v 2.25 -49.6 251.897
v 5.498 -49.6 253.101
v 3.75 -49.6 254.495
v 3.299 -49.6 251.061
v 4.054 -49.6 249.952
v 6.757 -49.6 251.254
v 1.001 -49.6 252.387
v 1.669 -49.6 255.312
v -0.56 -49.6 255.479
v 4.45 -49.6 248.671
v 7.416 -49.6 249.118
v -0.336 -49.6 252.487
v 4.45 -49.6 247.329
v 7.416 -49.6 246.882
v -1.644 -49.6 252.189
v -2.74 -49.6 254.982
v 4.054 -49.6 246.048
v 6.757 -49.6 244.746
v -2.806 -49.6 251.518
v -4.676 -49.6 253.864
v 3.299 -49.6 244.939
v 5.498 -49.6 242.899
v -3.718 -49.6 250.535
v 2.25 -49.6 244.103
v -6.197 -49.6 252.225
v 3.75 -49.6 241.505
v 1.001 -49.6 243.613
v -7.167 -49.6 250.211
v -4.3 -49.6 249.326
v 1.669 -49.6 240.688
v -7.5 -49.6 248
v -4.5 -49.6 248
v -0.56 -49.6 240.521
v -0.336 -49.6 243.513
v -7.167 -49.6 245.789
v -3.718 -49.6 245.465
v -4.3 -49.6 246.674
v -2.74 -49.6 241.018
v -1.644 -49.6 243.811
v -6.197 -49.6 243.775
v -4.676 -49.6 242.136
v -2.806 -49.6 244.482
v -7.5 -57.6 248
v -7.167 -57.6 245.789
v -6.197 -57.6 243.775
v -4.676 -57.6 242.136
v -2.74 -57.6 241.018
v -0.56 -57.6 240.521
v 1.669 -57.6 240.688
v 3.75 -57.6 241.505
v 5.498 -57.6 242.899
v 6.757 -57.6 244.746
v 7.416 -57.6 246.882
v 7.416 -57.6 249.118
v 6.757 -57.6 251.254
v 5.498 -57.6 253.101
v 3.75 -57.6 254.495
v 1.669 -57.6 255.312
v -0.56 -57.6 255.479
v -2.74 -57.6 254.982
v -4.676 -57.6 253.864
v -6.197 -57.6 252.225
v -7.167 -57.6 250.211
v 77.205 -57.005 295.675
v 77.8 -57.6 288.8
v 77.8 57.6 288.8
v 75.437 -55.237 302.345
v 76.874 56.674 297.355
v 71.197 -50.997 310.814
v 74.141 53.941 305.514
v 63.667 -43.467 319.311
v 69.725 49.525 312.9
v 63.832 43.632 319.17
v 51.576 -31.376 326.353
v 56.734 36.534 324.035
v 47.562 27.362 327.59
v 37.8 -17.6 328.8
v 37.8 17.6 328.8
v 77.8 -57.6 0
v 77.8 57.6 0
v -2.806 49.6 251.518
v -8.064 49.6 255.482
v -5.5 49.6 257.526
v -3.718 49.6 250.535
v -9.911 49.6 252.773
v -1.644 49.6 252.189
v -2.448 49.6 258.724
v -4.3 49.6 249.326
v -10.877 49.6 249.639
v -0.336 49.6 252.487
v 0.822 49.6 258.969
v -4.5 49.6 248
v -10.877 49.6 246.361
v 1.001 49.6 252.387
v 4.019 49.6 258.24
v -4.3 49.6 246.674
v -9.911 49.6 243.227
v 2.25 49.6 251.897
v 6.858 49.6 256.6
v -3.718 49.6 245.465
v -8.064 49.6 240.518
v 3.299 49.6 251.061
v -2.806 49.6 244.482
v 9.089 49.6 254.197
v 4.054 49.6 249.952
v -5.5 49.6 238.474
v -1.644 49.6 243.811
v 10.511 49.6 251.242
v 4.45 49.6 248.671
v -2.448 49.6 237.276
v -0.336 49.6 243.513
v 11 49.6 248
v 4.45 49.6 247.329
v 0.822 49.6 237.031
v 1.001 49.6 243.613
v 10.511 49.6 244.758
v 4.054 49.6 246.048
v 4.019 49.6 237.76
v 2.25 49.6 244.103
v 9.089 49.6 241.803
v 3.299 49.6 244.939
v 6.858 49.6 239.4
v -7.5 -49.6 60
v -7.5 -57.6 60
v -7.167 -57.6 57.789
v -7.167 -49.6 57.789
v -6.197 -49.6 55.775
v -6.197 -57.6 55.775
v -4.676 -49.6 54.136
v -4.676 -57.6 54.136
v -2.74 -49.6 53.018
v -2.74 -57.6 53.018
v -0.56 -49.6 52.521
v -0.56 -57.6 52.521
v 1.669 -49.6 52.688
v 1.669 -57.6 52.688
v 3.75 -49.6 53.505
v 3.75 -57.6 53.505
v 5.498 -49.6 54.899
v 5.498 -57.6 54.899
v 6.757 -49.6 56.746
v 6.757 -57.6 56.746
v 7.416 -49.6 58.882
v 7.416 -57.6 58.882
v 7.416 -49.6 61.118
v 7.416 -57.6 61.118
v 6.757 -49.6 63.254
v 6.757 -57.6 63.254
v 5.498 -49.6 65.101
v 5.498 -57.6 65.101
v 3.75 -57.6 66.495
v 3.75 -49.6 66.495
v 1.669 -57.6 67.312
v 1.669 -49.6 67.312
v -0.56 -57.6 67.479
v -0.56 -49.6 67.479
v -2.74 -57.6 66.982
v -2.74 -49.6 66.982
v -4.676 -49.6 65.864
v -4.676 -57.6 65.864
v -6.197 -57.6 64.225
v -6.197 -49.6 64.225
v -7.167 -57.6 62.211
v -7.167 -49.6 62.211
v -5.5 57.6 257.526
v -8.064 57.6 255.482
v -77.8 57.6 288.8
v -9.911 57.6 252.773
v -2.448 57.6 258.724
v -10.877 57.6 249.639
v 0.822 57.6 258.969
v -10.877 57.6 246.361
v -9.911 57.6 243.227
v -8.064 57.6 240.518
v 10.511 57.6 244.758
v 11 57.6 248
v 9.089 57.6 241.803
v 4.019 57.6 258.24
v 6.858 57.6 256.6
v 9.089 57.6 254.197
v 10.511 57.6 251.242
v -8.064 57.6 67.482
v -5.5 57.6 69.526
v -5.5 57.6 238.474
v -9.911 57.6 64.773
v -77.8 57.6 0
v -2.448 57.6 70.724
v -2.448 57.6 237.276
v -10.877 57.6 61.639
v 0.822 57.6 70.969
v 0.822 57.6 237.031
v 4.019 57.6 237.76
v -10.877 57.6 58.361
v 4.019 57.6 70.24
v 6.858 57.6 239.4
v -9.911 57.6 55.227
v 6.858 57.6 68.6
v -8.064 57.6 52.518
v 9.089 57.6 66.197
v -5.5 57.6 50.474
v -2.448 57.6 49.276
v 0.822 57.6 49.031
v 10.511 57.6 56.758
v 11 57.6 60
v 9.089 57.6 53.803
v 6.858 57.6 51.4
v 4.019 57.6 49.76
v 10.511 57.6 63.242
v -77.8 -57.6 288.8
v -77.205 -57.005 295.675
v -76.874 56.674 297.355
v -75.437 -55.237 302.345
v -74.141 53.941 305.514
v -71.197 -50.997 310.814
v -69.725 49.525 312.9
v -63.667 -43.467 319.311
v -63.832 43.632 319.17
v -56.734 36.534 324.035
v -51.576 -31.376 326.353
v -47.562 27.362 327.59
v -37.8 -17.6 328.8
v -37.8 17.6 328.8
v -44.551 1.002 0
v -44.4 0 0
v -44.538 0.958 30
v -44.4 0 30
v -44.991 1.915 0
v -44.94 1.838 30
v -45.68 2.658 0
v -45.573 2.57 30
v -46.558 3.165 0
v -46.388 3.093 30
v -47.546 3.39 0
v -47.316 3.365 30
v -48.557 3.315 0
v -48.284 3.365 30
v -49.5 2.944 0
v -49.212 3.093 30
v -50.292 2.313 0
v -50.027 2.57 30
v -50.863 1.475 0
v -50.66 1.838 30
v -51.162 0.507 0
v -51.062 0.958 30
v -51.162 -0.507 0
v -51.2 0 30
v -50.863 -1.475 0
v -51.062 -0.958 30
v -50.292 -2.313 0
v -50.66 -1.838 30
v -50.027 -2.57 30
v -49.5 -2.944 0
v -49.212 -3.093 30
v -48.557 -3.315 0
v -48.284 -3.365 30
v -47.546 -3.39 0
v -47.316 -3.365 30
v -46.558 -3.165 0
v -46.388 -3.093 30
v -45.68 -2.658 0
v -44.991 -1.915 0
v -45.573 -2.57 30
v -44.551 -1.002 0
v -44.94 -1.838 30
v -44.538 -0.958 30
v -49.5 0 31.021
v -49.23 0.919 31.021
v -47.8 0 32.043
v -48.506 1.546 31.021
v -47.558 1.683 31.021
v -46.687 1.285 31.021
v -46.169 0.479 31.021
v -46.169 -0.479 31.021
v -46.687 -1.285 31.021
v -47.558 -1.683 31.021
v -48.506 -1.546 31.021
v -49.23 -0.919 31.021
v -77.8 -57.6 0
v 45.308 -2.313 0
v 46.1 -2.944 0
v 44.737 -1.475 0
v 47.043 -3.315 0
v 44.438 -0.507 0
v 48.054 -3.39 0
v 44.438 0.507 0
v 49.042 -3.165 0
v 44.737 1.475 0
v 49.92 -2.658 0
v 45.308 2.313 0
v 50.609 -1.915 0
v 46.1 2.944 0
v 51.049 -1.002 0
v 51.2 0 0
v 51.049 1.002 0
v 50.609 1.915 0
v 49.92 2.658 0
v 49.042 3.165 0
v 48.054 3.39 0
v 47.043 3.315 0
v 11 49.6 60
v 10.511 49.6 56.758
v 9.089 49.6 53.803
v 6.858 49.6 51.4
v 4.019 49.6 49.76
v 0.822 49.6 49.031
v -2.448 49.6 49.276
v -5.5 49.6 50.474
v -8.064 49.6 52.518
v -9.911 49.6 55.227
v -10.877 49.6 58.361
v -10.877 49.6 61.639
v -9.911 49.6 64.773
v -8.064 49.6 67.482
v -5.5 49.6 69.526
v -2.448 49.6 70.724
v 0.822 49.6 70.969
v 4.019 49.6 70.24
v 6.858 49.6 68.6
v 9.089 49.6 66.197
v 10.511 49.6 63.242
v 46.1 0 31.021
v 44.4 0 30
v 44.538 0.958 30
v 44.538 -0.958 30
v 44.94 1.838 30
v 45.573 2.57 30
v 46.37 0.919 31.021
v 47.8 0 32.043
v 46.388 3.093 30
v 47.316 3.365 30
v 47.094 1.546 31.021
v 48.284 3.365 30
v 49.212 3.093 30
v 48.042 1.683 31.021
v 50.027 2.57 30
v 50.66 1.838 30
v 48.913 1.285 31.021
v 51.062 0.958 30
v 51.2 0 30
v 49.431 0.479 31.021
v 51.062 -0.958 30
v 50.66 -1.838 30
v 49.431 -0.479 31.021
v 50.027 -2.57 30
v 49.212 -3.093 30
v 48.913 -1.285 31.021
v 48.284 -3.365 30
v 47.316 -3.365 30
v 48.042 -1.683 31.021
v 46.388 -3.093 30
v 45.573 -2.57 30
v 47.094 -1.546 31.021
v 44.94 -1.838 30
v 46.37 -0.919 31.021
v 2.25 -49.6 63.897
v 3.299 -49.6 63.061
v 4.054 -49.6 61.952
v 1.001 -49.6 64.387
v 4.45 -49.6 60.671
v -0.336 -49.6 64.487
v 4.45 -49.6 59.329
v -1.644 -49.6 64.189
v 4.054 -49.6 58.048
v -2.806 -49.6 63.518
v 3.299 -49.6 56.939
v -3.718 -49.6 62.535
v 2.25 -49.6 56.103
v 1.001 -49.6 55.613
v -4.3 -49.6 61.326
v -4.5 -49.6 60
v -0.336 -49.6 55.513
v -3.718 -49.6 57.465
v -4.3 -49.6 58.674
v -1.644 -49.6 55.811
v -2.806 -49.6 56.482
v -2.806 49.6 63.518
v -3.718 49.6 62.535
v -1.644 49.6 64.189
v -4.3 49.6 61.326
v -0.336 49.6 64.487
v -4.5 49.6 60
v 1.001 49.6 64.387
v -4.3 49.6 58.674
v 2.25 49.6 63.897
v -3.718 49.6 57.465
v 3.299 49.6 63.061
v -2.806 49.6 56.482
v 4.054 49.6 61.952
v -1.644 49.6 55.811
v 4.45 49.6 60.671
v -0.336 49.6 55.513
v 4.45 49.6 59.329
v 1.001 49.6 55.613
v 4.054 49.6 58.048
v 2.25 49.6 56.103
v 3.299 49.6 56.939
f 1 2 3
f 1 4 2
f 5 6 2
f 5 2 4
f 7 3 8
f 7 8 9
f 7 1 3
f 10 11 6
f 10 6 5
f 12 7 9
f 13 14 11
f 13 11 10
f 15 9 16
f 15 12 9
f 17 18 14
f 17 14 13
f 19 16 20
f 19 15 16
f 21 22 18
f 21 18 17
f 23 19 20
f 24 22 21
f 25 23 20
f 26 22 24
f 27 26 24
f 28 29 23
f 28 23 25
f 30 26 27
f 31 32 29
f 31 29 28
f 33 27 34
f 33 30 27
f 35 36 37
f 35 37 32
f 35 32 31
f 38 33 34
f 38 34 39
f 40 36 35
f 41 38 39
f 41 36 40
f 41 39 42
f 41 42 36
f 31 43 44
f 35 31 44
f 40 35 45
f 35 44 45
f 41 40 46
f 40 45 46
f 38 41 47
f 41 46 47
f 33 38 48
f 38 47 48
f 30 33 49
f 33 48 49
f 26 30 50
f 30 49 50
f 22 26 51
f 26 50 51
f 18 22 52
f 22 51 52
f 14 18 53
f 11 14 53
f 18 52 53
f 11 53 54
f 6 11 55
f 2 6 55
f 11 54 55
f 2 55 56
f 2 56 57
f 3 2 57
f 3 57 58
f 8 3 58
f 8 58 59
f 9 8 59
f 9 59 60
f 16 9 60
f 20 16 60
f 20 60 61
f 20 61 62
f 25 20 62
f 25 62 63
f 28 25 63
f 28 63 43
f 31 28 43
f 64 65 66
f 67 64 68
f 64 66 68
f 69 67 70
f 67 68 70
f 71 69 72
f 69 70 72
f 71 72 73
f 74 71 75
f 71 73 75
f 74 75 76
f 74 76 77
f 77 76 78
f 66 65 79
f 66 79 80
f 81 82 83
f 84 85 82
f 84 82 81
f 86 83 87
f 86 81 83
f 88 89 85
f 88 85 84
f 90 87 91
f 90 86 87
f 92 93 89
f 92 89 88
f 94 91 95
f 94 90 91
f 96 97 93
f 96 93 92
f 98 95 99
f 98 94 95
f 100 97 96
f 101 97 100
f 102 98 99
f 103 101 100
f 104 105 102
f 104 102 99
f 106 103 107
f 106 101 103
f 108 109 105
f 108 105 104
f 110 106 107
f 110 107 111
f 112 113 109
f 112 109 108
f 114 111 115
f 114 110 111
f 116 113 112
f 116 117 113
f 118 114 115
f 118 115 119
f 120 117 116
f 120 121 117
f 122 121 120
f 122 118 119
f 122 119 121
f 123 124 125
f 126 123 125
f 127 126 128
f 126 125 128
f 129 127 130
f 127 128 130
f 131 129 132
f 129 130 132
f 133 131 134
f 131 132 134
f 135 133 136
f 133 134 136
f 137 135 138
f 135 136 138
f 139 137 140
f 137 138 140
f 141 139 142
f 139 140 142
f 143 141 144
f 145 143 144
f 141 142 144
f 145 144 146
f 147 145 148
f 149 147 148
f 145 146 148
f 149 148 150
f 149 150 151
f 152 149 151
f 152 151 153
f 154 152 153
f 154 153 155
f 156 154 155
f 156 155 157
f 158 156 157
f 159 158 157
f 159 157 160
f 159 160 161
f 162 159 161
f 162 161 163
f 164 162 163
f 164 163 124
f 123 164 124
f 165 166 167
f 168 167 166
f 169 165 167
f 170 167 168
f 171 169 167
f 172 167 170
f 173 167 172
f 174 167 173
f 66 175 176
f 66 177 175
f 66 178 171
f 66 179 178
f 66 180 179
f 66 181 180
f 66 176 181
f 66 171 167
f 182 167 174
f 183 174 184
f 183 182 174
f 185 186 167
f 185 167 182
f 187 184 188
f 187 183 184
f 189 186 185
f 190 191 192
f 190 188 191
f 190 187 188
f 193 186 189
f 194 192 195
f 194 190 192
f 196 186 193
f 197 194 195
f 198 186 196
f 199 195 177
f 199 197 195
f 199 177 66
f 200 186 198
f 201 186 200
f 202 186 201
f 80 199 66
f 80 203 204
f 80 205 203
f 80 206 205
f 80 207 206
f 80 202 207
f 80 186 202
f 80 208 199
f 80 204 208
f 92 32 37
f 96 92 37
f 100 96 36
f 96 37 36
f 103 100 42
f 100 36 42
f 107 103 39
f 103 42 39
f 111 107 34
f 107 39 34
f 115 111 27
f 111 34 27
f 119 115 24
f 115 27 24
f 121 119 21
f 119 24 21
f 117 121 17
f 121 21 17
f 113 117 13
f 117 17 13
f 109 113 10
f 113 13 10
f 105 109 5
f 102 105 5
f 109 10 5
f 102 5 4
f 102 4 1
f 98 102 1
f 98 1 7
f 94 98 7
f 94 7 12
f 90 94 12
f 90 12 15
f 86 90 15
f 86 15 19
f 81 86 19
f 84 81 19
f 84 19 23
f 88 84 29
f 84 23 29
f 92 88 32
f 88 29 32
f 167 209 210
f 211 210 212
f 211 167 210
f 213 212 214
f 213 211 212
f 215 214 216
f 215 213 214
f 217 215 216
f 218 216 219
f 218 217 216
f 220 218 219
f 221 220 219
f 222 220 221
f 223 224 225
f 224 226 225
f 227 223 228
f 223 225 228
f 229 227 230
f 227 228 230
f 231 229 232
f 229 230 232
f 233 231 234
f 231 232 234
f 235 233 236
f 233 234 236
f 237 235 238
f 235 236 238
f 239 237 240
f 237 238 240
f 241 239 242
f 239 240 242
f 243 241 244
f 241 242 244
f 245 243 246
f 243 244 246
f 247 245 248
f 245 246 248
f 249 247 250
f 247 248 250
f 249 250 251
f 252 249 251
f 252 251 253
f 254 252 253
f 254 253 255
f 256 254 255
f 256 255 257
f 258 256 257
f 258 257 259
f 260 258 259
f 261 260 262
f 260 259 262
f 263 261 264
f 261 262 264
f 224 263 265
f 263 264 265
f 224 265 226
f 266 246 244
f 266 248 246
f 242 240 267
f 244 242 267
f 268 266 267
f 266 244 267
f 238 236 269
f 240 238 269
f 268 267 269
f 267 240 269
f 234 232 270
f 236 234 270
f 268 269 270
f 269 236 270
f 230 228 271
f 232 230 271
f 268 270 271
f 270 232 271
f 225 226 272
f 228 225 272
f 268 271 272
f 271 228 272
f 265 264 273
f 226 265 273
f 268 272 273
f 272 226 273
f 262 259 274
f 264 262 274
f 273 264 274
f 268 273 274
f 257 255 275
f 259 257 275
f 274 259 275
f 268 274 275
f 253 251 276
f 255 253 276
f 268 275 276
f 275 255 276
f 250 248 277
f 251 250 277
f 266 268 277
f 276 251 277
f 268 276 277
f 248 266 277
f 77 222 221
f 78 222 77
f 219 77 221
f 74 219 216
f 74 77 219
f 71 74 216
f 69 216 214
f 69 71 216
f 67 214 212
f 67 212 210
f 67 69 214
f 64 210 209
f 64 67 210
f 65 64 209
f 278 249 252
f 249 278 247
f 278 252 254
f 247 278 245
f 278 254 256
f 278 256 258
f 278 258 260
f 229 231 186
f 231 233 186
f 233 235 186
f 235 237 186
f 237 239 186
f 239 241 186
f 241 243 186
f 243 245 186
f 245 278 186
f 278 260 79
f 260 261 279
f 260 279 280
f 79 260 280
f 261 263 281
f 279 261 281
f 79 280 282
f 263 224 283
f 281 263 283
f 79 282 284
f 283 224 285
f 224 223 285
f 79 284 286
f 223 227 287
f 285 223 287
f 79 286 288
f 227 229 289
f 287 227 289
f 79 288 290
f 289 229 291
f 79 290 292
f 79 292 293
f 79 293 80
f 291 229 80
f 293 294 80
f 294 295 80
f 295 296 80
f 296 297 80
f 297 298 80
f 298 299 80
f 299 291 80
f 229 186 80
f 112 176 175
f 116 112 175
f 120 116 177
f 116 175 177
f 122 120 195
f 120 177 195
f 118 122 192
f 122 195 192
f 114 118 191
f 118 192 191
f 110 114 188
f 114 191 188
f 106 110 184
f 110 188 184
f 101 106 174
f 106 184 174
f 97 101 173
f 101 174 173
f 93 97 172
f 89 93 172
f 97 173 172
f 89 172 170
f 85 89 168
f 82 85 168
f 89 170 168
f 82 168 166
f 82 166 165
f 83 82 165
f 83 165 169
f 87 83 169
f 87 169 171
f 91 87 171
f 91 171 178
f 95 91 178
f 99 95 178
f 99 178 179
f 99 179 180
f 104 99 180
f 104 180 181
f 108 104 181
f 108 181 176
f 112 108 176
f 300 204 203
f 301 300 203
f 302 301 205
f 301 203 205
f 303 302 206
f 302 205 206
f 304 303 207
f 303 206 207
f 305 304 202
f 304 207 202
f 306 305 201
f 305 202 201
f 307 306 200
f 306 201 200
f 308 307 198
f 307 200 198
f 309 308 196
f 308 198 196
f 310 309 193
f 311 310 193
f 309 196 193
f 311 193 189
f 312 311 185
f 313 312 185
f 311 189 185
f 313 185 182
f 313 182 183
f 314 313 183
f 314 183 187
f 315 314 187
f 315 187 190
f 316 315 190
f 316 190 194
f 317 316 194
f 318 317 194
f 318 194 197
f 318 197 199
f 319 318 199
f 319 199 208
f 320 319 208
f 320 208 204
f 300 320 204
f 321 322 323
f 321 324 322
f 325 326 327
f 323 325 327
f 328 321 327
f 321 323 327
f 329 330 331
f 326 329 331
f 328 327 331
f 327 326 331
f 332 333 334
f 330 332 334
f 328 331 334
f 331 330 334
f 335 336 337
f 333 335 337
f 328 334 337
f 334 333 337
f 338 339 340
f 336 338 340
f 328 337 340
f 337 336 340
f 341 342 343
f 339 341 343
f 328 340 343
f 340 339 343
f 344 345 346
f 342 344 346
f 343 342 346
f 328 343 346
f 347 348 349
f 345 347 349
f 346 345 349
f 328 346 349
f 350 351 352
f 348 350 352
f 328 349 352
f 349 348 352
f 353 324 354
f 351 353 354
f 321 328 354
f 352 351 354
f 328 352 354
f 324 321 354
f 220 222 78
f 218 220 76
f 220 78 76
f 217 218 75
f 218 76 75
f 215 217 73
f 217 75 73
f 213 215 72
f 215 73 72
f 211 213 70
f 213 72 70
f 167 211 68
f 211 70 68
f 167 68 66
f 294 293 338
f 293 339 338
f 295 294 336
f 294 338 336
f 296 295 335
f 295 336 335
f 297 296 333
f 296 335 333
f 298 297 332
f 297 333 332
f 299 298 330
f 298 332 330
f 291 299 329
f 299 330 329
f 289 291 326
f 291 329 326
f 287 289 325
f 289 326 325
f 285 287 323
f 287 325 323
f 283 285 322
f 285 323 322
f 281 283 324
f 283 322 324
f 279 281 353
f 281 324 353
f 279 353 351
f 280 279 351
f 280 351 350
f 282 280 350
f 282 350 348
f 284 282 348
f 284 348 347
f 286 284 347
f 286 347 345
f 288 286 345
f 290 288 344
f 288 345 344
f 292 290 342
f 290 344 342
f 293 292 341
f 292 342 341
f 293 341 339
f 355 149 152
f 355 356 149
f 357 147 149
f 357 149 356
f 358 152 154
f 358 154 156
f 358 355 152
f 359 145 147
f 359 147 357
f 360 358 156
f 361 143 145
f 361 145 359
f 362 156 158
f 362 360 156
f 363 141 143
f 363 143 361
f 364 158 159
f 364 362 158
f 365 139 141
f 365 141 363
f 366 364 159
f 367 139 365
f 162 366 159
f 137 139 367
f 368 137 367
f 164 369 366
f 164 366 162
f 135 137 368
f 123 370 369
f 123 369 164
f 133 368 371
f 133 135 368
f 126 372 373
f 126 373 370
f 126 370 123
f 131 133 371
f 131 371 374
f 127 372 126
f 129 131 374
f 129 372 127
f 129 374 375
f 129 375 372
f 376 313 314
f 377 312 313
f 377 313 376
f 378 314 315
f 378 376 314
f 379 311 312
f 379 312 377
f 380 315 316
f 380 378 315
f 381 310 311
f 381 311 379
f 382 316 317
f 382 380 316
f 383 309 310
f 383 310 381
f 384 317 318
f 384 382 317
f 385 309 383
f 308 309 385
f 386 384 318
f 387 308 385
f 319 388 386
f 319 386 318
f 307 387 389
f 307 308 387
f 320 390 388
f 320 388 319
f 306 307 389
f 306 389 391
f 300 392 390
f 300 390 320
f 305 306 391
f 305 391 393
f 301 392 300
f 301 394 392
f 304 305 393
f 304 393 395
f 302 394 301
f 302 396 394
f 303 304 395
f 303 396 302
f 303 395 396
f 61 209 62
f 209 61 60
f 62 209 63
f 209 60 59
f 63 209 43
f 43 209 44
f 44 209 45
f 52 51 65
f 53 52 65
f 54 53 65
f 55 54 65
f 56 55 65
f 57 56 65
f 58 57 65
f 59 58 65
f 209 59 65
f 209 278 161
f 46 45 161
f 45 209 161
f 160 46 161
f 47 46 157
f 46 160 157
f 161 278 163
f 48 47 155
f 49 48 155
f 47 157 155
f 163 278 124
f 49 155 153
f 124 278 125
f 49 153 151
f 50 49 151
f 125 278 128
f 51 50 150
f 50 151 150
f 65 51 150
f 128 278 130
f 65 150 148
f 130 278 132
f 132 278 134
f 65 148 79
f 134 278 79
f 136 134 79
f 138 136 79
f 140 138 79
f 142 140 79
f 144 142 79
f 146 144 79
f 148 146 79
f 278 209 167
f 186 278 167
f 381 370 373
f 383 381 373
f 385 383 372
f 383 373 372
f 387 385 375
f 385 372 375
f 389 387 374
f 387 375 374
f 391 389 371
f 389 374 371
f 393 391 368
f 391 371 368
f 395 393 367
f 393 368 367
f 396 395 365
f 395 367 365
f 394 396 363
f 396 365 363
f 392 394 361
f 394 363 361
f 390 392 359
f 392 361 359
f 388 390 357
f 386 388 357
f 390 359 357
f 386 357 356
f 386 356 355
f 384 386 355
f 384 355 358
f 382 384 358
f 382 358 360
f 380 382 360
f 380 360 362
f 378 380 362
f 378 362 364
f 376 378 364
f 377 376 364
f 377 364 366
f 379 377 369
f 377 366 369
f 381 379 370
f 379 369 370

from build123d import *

# Parameters (mm, degrees)
SKIZZE1_W                                           = 155.6
SKIZZE1_H                                           = 115.2
AUFSATZ_LINEAR_AUSTRAGEN1_DEPTH                     = 328.8
SCHNITT_LINEAR_AUSTRAGEN1_DEPTH                     = 328.8
SCHNITT_LINEAR_AUSTRAGEN2_DEPTH                     = 328.8
KERNLOCH_F_R_M8X1_251_D                             = 6.8
KERNLOCH_F_R_M8X1_251_DEPTH                         = 30
KERNLOCH_F_R_M8X1_251_TIP                           = 2.042926105
STIRNSENKUNG_F_R_M8_SENKSCHRAUBE_KOPF_B_D           = 9
STIRNSENKUNG_F_R_M8_SENKSCHRAUBE_KOPF_B_CBORE_D     = 22
STIRNSENKUNG_F_R_M8_SENKSCHRAUBE_KOPF_B_CBORE_DEPTH = 8
STIRNSENKUNG_F_R_M8_SENKSCHRAUBE_KO_2_D             = 9
STIRNSENKUNG_F_R_M8_SENKSCHRAUBE_KO_2_CBORE_D       = 15
STIRNSENKUNG_F_R_M8_SENKSCHRAUBE_KO_2_CBORE_DEPTH   = 8


with BuildPart() as part:
    # Skizze1 → Aufsatz-Linear austragen1 (new body)
    with BuildSketch(Plane.XY):
        Rectangle(SKIZZE1_W, SKIZZE1_H)
    extrude(amount=AUFSATZ_LINEAR_AUSTRAGEN1_DEPTH)

    # Skizze2 → Schnitt-Linear austragen1 (cut)
    with BuildSketch(Plane(origin=(77.8, 0, 0), x_dir=(0, 0, -1), z_dir=(1, 0, 0))):
        with BuildLine():
            Line((-288.8, 57.6), (-212.381166773, 57.6))
            Line((-212.381166773, 57.6), (-328.8, 118.277888245))
            Line((-328.8, 118.277888245), (-328.8, 17.6))
            ThreePointArc((-328.8, 17.6), (-317.084271247, 45.884271247), (-288.8, 57.6))
        make_face()
    schnitt_linear_austragen1 = extrude(amount=-SCHNITT_LINEAR_AUSTRAGEN1_DEPTH, mode=Mode.SUBTRACT)

    # Spiegeln1: Schnitt-Linear austragen1 across plane
    add(schnitt_linear_austragen1.mirror(Plane.ZX), mode=Mode.SUBTRACT)

    # Skizze3 → Schnitt-Linear austragen2 (cut)
    with BuildSketch(Plane(origin=(0, 57.6, 0), x_dir=(1, 0, 0), z_dir=(0, 1, 0))):
        with BuildLine():
            Line((-77.8, -328.8), (-77.8, -288.8))
            ThreePointArc((-77.8, -288.8), (-66.084271247, -317.084271247), (-37.8, -328.8))
            Line((-37.8, -328.8), (-77.8, -328.8))
        make_face()
    schnitt_linear_austragen2 = extrude(amount=-SCHNITT_LINEAR_AUSTRAGEN2_DEPTH, mode=Mode.SUBTRACT)

    # Spiegeln2: Schnitt-Linear austragen2 across plane
    add(schnitt_linear_austragen2.mirror(Plane(origin=(0, 0, 0), x_dir=(0, 0, 1), z_dir=(1, 0, 0))), mode=Mode.SUBTRACT)

    # Kernloch für M8x1.251
    with Locations(Plane(origin=(0, 0, 0), x_dir=(-1, 0, 0), z_dir=(0, 0, -1))):
        with Locations((-47.8, 0), (47.8, 0)):
            Hole(KERNLOCH_F_R_M8X1_251_D / 2, depth=KERNLOCH_F_R_M8X1_251_DEPTH)
            with Locations((0, 0, -(KERNLOCH_F_R_M8X1_251_DEPTH + KERNLOCH_F_R_M8X1_251_TIP / 2))):  # 118° drill point
                Cone(0, KERNLOCH_F_R_M8X1_251_D / 2, KERNLOCH_F_R_M8X1_251_TIP, mode=Mode.SUBTRACT)

    # Stirnsenkung f_r M8 Senkschraube _Kopf B (through all)
    with Locations(Plane(origin=(0, 57.6, 0), x_dir=(1, 0, 0), z_dir=(0, 1, 0))):
        with Locations((0, -248), (0, -60)):
            CounterBoreHole(STIRNSENKUNG_F_R_M8_SENKSCHRAUBE_KOPF_B_D / 2, STIRNSENKUNG_F_R_M8_SENKSCHRAUBE_KOPF_B_CBORE_D / 2, STIRNSENKUNG_F_R_M8_SENKSCHRAUBE_KOPF_B_CBORE_DEPTH)

    # Stirnsenkung f_r M8 Senkschraube _Ko 2 (through all)
    with Locations(Plane(origin=(0, -57.6, 0), x_dir=(-1, 0, 0), z_dir=(0, -1, 0))):
        with Locations((0, -248), (0, -60)):
            CounterBoreHole(STIRNSENKUNG_F_R_M8_SENKSCHRAUBE_KO_2_D / 2, STIRNSENKUNG_F_R_M8_SENKSCHRAUBE_KO_2_CBORE_D / 2, STIRNSENKUNG_F_R_M8_SENKSCHRAUBE_KO_2_CBORE_DEPTH)


solid = part.part
